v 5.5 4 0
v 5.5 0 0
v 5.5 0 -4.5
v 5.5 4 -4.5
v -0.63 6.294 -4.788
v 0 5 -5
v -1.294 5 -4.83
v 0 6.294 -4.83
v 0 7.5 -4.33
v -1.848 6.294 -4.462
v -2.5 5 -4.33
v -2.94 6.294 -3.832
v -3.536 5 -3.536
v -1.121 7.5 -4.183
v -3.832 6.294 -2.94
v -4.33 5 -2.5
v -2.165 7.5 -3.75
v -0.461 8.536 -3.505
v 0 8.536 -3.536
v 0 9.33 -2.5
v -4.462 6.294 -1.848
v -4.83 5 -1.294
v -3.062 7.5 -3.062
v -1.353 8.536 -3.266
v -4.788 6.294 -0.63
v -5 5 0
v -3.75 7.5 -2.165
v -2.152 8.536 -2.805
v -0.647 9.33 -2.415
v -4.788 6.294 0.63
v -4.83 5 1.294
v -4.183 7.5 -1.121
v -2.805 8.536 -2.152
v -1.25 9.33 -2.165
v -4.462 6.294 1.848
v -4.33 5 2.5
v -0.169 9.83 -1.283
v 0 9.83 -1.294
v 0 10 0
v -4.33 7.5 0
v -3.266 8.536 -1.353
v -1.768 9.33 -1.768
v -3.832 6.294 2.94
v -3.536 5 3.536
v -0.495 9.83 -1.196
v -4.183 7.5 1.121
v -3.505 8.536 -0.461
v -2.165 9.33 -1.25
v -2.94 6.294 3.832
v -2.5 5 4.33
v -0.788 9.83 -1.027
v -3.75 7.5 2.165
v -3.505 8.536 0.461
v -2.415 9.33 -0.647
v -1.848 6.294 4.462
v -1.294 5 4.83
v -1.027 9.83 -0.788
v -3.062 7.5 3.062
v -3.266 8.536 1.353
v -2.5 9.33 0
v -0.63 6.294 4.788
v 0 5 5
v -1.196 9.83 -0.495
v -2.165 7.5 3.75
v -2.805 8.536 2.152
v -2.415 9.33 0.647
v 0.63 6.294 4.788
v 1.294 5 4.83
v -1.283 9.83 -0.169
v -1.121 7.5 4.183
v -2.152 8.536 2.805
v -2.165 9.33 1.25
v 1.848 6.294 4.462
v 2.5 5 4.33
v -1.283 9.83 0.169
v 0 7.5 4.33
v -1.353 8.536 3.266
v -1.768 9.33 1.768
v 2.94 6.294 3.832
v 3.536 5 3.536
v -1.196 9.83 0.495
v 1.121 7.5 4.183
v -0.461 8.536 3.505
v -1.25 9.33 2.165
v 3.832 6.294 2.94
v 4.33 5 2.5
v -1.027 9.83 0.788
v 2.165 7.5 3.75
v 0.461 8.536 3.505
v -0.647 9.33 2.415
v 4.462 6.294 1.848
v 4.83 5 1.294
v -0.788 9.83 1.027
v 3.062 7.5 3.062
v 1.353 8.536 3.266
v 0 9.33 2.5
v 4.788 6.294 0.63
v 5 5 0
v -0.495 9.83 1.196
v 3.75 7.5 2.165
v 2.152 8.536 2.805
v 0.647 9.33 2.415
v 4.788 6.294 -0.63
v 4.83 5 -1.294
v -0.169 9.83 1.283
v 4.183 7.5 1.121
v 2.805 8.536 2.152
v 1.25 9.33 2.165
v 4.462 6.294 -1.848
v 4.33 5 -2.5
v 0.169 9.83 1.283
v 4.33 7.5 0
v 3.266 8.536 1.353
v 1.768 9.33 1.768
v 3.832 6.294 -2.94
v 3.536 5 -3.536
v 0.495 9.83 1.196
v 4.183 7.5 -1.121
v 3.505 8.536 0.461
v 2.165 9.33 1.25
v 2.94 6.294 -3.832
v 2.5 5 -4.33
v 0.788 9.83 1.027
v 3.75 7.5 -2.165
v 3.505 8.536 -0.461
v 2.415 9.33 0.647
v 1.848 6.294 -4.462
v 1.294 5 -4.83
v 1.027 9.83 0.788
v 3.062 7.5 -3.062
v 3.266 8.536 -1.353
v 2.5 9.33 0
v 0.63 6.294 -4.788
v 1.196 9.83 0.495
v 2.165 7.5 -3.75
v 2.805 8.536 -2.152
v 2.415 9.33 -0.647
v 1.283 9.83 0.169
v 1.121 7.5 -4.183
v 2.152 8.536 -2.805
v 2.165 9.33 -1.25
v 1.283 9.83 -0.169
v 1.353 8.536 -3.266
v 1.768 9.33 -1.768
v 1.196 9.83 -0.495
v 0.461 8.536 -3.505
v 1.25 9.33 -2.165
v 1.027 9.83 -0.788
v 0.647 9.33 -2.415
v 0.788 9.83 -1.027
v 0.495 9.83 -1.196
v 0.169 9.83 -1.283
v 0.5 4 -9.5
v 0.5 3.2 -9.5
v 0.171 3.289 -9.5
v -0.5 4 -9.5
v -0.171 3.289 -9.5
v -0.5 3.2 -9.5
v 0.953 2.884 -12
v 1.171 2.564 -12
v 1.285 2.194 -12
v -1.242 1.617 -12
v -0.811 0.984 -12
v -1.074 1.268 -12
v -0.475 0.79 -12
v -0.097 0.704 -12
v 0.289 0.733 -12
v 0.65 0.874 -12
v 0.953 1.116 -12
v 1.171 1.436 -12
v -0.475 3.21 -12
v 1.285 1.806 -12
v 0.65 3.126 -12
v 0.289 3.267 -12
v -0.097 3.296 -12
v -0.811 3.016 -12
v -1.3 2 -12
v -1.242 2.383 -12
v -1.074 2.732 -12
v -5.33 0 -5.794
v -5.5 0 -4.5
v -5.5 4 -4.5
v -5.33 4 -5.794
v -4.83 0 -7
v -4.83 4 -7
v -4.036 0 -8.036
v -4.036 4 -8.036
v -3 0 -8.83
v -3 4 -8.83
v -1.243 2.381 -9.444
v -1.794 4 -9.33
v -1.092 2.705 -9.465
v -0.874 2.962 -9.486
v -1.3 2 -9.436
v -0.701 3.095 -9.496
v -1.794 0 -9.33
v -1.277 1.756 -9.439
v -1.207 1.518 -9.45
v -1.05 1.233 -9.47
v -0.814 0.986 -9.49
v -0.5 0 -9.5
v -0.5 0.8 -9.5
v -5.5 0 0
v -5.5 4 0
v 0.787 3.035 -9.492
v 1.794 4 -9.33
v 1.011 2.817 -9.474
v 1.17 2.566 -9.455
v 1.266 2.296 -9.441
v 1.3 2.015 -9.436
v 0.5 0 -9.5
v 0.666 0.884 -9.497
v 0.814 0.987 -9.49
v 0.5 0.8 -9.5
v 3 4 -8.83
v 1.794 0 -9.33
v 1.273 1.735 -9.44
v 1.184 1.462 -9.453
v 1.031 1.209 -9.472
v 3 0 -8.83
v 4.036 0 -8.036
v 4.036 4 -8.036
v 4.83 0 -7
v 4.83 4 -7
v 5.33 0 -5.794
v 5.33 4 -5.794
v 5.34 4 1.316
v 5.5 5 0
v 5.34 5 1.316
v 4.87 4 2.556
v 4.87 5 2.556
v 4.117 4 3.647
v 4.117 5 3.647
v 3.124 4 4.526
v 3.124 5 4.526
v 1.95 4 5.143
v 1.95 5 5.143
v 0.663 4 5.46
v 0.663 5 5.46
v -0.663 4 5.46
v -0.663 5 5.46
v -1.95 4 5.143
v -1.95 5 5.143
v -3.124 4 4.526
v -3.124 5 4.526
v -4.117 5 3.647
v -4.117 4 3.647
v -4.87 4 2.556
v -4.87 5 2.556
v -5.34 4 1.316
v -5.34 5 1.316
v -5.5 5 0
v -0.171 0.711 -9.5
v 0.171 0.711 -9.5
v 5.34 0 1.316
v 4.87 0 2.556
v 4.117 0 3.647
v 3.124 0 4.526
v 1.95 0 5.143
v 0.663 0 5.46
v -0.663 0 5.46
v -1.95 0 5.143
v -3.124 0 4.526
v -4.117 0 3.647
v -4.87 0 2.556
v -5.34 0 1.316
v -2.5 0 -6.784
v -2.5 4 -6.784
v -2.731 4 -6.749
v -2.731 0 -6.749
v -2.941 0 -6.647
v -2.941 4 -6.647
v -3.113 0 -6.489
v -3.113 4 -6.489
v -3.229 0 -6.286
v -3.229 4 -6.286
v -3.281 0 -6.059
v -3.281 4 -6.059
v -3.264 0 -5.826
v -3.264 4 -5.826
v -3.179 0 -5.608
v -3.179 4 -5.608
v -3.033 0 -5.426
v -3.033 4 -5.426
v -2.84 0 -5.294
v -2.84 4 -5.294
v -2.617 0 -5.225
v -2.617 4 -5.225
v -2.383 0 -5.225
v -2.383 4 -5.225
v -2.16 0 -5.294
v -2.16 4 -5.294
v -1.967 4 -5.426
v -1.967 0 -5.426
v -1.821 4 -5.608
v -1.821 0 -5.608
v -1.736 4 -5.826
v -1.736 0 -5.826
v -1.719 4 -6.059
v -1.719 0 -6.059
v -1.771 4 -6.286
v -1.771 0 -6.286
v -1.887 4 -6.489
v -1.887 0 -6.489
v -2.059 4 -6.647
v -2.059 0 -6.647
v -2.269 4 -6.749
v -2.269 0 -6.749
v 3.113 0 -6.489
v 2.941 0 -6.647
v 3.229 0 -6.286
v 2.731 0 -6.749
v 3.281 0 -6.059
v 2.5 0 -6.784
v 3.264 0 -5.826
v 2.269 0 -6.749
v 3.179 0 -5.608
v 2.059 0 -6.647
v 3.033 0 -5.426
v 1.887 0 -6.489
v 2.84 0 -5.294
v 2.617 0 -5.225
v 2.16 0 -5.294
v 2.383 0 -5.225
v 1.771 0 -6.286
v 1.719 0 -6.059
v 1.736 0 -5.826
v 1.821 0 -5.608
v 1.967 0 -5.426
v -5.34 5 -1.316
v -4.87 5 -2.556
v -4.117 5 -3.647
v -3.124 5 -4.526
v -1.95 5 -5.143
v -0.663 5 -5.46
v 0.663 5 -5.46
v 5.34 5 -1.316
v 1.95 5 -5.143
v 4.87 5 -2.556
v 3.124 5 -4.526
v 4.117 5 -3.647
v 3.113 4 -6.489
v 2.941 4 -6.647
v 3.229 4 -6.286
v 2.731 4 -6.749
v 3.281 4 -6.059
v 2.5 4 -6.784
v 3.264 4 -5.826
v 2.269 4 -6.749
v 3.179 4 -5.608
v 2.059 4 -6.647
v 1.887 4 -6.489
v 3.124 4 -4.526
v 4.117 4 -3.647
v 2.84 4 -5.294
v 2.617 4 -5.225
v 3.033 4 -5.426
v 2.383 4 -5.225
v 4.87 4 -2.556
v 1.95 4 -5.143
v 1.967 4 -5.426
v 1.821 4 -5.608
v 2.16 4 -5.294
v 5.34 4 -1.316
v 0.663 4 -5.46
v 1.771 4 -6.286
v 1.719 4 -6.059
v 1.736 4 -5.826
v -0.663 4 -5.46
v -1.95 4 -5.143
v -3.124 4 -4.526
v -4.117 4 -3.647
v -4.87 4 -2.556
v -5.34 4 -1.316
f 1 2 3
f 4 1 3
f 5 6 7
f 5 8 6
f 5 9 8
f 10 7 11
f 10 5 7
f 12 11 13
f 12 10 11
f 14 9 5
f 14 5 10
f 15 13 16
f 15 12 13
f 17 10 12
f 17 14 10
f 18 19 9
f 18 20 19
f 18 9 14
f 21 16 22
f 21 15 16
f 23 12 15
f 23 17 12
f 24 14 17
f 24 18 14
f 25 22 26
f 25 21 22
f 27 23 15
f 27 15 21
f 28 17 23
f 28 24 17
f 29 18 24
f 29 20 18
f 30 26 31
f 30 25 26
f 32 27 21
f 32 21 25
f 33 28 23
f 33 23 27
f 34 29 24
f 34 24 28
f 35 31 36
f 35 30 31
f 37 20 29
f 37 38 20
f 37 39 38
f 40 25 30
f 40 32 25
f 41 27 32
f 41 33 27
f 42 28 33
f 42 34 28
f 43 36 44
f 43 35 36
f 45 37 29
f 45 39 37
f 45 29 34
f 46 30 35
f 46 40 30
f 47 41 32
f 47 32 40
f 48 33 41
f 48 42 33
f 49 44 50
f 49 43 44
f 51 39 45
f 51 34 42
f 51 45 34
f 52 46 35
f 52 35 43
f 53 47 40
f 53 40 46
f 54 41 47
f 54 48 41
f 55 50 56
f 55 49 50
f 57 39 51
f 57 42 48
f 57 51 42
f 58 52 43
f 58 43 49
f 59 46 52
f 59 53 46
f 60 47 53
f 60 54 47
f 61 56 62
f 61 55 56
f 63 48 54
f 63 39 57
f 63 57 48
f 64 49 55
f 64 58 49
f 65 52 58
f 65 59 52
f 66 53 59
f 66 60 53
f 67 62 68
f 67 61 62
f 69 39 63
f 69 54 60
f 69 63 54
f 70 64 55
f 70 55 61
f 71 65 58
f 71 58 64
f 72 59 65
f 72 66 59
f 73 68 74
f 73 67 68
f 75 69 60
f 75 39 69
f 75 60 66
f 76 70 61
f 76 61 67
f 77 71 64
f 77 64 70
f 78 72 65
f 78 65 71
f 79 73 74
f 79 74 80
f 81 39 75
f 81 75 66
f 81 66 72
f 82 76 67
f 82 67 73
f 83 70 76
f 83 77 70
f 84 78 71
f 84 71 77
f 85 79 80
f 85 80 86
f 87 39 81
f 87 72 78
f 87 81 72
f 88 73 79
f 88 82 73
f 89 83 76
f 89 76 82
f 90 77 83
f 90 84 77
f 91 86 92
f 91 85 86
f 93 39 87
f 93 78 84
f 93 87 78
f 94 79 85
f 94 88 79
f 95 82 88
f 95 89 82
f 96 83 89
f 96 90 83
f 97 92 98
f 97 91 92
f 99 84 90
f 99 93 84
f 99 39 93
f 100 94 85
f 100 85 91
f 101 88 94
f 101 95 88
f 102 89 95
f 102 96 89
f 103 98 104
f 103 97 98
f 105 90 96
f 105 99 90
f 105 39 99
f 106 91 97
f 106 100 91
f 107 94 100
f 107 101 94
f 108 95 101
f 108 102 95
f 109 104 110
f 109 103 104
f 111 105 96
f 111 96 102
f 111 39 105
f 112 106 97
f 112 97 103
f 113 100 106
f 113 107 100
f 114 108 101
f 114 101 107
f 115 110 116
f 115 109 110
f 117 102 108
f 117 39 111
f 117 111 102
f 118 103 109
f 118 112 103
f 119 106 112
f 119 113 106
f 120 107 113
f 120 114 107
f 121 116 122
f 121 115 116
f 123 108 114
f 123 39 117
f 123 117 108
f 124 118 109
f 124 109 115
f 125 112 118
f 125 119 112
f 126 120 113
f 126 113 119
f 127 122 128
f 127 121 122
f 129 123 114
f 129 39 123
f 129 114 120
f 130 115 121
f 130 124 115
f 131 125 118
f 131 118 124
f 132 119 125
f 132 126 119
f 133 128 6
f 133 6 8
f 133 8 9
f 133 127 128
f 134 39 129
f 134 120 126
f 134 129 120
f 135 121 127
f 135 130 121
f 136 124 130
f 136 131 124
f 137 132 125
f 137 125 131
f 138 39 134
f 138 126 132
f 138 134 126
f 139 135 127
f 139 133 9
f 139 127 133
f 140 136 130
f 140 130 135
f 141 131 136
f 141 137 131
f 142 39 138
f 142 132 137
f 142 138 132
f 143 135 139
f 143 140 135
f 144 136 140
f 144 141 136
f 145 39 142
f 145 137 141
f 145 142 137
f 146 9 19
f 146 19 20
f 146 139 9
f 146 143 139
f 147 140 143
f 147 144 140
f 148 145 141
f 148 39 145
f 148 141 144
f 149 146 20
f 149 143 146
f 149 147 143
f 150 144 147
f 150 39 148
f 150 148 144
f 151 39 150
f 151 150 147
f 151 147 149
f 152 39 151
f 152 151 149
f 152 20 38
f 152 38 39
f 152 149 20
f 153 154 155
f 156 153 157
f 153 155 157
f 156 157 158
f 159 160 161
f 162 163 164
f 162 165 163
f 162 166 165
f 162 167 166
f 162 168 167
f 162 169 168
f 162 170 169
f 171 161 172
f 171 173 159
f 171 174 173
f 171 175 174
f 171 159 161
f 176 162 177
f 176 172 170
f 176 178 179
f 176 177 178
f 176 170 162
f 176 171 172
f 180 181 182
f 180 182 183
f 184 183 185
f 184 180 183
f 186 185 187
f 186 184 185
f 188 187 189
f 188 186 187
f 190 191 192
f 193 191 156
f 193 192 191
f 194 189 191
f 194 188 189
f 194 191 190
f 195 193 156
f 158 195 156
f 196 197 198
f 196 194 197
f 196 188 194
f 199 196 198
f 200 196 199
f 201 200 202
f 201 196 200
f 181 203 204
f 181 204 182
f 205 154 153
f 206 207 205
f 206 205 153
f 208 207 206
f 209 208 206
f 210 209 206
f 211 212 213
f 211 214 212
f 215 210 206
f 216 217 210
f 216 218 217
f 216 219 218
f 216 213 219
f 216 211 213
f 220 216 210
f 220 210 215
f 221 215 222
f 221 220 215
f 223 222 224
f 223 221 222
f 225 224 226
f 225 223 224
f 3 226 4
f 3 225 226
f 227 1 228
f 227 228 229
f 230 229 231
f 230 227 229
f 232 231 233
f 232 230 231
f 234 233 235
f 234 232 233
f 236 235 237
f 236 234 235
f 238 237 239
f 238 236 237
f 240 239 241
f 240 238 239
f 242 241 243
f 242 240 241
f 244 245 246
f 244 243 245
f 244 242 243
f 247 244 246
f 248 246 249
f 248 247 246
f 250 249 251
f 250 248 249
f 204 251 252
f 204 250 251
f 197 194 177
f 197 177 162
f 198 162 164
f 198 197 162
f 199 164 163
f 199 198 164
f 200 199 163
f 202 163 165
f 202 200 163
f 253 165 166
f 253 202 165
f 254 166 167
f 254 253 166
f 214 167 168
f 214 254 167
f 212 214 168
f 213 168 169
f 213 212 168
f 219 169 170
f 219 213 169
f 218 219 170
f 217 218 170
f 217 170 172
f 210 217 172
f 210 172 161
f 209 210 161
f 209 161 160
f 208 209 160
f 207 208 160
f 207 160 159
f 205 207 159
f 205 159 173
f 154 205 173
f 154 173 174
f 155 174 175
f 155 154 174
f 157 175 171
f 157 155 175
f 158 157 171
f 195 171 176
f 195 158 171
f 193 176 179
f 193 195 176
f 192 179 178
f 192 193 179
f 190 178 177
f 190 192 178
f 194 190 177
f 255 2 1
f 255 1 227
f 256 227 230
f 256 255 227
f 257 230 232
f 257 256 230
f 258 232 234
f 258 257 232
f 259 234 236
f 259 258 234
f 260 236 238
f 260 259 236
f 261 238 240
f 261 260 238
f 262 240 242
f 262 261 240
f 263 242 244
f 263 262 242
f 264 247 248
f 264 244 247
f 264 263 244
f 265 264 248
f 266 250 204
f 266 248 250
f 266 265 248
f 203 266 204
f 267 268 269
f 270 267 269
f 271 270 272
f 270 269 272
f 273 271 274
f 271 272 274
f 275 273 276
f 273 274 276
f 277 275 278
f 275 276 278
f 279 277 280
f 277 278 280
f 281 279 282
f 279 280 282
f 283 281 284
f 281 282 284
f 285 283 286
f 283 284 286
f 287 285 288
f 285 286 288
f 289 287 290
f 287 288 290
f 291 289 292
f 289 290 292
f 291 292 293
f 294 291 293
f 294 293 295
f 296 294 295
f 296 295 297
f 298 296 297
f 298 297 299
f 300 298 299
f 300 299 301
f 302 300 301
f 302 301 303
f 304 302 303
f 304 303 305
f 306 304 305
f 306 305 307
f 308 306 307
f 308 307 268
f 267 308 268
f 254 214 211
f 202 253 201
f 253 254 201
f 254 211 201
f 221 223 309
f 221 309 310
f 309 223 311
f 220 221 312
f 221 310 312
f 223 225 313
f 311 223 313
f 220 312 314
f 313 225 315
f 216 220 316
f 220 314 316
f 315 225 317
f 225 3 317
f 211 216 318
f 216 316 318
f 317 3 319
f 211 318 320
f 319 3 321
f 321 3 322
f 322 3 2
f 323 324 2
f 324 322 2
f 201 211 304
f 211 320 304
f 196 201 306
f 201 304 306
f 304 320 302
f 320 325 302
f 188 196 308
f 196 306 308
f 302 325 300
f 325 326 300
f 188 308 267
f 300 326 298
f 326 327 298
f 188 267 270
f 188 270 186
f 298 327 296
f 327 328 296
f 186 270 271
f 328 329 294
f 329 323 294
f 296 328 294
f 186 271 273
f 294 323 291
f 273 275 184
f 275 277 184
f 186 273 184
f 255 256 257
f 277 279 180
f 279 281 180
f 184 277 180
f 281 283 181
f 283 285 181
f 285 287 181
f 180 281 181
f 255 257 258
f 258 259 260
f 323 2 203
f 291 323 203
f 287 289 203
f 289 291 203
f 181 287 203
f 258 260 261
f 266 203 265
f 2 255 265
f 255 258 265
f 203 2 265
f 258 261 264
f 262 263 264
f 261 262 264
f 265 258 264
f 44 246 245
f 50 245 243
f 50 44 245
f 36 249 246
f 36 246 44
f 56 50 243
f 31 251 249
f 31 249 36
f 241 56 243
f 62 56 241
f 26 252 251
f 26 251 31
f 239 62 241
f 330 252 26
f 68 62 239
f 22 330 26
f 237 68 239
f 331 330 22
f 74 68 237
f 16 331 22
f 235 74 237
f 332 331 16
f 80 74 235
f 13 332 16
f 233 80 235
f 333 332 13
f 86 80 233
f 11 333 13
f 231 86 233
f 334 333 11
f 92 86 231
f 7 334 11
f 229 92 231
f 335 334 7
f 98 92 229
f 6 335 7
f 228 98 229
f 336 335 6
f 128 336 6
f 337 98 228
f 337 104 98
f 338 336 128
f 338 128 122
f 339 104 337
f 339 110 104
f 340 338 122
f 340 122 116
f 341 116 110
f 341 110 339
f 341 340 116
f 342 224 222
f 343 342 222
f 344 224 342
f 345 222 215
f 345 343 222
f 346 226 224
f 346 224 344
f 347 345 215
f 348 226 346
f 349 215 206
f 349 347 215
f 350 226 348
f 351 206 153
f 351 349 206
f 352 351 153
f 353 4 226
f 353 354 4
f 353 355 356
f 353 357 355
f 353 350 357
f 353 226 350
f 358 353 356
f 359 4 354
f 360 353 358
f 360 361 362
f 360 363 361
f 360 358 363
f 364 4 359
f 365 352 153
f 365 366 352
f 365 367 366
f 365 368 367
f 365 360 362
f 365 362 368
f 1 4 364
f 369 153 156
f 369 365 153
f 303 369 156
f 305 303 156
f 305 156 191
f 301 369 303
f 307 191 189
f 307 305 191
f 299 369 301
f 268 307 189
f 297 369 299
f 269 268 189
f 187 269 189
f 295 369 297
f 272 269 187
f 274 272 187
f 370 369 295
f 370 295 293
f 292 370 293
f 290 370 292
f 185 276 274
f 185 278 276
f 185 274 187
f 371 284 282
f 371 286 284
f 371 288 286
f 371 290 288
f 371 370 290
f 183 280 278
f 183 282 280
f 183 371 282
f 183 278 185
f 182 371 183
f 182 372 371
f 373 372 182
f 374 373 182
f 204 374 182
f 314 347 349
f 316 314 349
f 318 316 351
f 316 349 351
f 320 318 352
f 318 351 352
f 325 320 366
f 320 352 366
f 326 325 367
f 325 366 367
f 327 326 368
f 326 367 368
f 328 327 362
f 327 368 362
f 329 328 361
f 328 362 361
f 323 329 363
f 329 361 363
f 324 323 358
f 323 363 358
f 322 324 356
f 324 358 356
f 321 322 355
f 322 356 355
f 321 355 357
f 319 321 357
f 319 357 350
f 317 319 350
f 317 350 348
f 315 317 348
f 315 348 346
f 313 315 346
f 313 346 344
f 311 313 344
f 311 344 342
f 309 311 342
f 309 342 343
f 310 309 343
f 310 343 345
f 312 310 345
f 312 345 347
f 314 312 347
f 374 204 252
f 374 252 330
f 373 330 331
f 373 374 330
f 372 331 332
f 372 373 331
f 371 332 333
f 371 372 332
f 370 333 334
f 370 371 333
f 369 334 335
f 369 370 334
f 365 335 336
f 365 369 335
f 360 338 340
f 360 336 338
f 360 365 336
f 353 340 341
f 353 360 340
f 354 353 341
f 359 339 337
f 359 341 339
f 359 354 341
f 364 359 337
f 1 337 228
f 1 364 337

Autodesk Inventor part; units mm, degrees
ref_plane "YZ Plane" through (0, 0, 0) normal (1, 0, 0) x (0, 1, 0)
sketch "Sketch1" plane through (0, 0, 0) normal (0, 1, 0) x (-1, 0, 0)
  arc A0 (5.5, 0) -> (-5.5, 0) centre (0, 0) ccw
  line L0 (5.5, 0) -> (5.5, -4.5)
  line L1 (-5.5, 0) -> (-5.5, -4.5)
  line L2 (-0.5, -9.5) -> (0.5, -9.5)
  arc A1 (-5.5, -4.5) -> (-0.5, -9.5) centre (-0.5, -4.5) ccw
  arc A2 (0.5, -9.5) -> (5.5, -4.5) centre (0.5, -4.5) ccw
  line L3 (0, 0) -> (0, -9.5) construction
  dimension "d0" = 11
  dimension "d1" = 15
  dimension "d2" = 5
extrude "Extrusion1" add sketch "Sketch1" along normal blind 4
sketch "Sketch2" plane through (0, 4, 0) normal (0, 1, 0) x (1, 0, 0)
  circle A0 centre (0, 0) radius 5.5
  arc A1 (-5.5, 0) -> (5.5, 0) centre (0, 0) ccw projected
extrude "Extrusion2" add sketch "Sketch2" along normal blind 1
ref_plane "Work Plane1" through (0, 0, 0) normal (1, 0, 0) x (0, 0, -1)
sketch "Sketch4" plane through (0, 0, 0) normal (1, 0, 0) x (0, 0, -1)
  line L0 (5.5, 5) -> (-5.5, 5) projected
  line L1 (0, 5) -> (0, 11.0328) construction
  arc A0 (5, 5) -> (0, 10) centre (0, 5) ccw
  line L2 (0, 10) -> (0, 5)
  line L3 (0, 5) -> (5, 5)
  point P0 (0, 0)
  dimension "d8" = 5
revolve "Revolution1" add sketch "Sketch4" angle 360 about axis through (0, 5, 0) along (0, 1, 0)
sketch "Sketch5" plane through (0, 0, 0) normal (0, -1, 0) x (1, 0, 0)
  line L0 (0, 0) -> (0, -9.4931) construction
  point P0 (2.5, -6)
  point P1 (-2.5, -6)
  dimension "d10" = 6
  dimension "d11" = 5
hole "Hole1" at (2.5, 0, -6) at (-2.5, 0, -6) direction (0, 1, 0) diameter 1.567 end through all thread size "M2x0.4" class "6H" standard "ANSI Metric M Profile"
ref_plane "Work Plane2" through (0.5, 0, -9) normal (0, 0, -1) x (-1, 0, 0)
sketch "Sketch6" plane through (0.5, 0, -9) normal (0, 0, -1) x (-1, 0, 0)
  line L0 (0, 0) -> (1, 0) projected
  line L1 (1, 0) -> (1, 4) projected
  line L2 (0, 4) -> (1, 4) projected
  line L3 (0, 0) -> (0, 4) projected
  line L4 (0, 0) -> (0, 4) projected
  line L5 (0, 2) -> (1, 2) construction
  line L6 (1, 0) -> (1, 4) projected
  circle A0 centre (0.5, 2) radius 1.3
  point P0 (0.5, 0)
  dimension "d20" = 2.6
extrude "Extrusion3" add sketch "Sketch6" along normal blind 3 contours A0 L3 | L3 A0 L1 | L1 A0
properties part number "OptoForce_OMD-10-SE-10N"
